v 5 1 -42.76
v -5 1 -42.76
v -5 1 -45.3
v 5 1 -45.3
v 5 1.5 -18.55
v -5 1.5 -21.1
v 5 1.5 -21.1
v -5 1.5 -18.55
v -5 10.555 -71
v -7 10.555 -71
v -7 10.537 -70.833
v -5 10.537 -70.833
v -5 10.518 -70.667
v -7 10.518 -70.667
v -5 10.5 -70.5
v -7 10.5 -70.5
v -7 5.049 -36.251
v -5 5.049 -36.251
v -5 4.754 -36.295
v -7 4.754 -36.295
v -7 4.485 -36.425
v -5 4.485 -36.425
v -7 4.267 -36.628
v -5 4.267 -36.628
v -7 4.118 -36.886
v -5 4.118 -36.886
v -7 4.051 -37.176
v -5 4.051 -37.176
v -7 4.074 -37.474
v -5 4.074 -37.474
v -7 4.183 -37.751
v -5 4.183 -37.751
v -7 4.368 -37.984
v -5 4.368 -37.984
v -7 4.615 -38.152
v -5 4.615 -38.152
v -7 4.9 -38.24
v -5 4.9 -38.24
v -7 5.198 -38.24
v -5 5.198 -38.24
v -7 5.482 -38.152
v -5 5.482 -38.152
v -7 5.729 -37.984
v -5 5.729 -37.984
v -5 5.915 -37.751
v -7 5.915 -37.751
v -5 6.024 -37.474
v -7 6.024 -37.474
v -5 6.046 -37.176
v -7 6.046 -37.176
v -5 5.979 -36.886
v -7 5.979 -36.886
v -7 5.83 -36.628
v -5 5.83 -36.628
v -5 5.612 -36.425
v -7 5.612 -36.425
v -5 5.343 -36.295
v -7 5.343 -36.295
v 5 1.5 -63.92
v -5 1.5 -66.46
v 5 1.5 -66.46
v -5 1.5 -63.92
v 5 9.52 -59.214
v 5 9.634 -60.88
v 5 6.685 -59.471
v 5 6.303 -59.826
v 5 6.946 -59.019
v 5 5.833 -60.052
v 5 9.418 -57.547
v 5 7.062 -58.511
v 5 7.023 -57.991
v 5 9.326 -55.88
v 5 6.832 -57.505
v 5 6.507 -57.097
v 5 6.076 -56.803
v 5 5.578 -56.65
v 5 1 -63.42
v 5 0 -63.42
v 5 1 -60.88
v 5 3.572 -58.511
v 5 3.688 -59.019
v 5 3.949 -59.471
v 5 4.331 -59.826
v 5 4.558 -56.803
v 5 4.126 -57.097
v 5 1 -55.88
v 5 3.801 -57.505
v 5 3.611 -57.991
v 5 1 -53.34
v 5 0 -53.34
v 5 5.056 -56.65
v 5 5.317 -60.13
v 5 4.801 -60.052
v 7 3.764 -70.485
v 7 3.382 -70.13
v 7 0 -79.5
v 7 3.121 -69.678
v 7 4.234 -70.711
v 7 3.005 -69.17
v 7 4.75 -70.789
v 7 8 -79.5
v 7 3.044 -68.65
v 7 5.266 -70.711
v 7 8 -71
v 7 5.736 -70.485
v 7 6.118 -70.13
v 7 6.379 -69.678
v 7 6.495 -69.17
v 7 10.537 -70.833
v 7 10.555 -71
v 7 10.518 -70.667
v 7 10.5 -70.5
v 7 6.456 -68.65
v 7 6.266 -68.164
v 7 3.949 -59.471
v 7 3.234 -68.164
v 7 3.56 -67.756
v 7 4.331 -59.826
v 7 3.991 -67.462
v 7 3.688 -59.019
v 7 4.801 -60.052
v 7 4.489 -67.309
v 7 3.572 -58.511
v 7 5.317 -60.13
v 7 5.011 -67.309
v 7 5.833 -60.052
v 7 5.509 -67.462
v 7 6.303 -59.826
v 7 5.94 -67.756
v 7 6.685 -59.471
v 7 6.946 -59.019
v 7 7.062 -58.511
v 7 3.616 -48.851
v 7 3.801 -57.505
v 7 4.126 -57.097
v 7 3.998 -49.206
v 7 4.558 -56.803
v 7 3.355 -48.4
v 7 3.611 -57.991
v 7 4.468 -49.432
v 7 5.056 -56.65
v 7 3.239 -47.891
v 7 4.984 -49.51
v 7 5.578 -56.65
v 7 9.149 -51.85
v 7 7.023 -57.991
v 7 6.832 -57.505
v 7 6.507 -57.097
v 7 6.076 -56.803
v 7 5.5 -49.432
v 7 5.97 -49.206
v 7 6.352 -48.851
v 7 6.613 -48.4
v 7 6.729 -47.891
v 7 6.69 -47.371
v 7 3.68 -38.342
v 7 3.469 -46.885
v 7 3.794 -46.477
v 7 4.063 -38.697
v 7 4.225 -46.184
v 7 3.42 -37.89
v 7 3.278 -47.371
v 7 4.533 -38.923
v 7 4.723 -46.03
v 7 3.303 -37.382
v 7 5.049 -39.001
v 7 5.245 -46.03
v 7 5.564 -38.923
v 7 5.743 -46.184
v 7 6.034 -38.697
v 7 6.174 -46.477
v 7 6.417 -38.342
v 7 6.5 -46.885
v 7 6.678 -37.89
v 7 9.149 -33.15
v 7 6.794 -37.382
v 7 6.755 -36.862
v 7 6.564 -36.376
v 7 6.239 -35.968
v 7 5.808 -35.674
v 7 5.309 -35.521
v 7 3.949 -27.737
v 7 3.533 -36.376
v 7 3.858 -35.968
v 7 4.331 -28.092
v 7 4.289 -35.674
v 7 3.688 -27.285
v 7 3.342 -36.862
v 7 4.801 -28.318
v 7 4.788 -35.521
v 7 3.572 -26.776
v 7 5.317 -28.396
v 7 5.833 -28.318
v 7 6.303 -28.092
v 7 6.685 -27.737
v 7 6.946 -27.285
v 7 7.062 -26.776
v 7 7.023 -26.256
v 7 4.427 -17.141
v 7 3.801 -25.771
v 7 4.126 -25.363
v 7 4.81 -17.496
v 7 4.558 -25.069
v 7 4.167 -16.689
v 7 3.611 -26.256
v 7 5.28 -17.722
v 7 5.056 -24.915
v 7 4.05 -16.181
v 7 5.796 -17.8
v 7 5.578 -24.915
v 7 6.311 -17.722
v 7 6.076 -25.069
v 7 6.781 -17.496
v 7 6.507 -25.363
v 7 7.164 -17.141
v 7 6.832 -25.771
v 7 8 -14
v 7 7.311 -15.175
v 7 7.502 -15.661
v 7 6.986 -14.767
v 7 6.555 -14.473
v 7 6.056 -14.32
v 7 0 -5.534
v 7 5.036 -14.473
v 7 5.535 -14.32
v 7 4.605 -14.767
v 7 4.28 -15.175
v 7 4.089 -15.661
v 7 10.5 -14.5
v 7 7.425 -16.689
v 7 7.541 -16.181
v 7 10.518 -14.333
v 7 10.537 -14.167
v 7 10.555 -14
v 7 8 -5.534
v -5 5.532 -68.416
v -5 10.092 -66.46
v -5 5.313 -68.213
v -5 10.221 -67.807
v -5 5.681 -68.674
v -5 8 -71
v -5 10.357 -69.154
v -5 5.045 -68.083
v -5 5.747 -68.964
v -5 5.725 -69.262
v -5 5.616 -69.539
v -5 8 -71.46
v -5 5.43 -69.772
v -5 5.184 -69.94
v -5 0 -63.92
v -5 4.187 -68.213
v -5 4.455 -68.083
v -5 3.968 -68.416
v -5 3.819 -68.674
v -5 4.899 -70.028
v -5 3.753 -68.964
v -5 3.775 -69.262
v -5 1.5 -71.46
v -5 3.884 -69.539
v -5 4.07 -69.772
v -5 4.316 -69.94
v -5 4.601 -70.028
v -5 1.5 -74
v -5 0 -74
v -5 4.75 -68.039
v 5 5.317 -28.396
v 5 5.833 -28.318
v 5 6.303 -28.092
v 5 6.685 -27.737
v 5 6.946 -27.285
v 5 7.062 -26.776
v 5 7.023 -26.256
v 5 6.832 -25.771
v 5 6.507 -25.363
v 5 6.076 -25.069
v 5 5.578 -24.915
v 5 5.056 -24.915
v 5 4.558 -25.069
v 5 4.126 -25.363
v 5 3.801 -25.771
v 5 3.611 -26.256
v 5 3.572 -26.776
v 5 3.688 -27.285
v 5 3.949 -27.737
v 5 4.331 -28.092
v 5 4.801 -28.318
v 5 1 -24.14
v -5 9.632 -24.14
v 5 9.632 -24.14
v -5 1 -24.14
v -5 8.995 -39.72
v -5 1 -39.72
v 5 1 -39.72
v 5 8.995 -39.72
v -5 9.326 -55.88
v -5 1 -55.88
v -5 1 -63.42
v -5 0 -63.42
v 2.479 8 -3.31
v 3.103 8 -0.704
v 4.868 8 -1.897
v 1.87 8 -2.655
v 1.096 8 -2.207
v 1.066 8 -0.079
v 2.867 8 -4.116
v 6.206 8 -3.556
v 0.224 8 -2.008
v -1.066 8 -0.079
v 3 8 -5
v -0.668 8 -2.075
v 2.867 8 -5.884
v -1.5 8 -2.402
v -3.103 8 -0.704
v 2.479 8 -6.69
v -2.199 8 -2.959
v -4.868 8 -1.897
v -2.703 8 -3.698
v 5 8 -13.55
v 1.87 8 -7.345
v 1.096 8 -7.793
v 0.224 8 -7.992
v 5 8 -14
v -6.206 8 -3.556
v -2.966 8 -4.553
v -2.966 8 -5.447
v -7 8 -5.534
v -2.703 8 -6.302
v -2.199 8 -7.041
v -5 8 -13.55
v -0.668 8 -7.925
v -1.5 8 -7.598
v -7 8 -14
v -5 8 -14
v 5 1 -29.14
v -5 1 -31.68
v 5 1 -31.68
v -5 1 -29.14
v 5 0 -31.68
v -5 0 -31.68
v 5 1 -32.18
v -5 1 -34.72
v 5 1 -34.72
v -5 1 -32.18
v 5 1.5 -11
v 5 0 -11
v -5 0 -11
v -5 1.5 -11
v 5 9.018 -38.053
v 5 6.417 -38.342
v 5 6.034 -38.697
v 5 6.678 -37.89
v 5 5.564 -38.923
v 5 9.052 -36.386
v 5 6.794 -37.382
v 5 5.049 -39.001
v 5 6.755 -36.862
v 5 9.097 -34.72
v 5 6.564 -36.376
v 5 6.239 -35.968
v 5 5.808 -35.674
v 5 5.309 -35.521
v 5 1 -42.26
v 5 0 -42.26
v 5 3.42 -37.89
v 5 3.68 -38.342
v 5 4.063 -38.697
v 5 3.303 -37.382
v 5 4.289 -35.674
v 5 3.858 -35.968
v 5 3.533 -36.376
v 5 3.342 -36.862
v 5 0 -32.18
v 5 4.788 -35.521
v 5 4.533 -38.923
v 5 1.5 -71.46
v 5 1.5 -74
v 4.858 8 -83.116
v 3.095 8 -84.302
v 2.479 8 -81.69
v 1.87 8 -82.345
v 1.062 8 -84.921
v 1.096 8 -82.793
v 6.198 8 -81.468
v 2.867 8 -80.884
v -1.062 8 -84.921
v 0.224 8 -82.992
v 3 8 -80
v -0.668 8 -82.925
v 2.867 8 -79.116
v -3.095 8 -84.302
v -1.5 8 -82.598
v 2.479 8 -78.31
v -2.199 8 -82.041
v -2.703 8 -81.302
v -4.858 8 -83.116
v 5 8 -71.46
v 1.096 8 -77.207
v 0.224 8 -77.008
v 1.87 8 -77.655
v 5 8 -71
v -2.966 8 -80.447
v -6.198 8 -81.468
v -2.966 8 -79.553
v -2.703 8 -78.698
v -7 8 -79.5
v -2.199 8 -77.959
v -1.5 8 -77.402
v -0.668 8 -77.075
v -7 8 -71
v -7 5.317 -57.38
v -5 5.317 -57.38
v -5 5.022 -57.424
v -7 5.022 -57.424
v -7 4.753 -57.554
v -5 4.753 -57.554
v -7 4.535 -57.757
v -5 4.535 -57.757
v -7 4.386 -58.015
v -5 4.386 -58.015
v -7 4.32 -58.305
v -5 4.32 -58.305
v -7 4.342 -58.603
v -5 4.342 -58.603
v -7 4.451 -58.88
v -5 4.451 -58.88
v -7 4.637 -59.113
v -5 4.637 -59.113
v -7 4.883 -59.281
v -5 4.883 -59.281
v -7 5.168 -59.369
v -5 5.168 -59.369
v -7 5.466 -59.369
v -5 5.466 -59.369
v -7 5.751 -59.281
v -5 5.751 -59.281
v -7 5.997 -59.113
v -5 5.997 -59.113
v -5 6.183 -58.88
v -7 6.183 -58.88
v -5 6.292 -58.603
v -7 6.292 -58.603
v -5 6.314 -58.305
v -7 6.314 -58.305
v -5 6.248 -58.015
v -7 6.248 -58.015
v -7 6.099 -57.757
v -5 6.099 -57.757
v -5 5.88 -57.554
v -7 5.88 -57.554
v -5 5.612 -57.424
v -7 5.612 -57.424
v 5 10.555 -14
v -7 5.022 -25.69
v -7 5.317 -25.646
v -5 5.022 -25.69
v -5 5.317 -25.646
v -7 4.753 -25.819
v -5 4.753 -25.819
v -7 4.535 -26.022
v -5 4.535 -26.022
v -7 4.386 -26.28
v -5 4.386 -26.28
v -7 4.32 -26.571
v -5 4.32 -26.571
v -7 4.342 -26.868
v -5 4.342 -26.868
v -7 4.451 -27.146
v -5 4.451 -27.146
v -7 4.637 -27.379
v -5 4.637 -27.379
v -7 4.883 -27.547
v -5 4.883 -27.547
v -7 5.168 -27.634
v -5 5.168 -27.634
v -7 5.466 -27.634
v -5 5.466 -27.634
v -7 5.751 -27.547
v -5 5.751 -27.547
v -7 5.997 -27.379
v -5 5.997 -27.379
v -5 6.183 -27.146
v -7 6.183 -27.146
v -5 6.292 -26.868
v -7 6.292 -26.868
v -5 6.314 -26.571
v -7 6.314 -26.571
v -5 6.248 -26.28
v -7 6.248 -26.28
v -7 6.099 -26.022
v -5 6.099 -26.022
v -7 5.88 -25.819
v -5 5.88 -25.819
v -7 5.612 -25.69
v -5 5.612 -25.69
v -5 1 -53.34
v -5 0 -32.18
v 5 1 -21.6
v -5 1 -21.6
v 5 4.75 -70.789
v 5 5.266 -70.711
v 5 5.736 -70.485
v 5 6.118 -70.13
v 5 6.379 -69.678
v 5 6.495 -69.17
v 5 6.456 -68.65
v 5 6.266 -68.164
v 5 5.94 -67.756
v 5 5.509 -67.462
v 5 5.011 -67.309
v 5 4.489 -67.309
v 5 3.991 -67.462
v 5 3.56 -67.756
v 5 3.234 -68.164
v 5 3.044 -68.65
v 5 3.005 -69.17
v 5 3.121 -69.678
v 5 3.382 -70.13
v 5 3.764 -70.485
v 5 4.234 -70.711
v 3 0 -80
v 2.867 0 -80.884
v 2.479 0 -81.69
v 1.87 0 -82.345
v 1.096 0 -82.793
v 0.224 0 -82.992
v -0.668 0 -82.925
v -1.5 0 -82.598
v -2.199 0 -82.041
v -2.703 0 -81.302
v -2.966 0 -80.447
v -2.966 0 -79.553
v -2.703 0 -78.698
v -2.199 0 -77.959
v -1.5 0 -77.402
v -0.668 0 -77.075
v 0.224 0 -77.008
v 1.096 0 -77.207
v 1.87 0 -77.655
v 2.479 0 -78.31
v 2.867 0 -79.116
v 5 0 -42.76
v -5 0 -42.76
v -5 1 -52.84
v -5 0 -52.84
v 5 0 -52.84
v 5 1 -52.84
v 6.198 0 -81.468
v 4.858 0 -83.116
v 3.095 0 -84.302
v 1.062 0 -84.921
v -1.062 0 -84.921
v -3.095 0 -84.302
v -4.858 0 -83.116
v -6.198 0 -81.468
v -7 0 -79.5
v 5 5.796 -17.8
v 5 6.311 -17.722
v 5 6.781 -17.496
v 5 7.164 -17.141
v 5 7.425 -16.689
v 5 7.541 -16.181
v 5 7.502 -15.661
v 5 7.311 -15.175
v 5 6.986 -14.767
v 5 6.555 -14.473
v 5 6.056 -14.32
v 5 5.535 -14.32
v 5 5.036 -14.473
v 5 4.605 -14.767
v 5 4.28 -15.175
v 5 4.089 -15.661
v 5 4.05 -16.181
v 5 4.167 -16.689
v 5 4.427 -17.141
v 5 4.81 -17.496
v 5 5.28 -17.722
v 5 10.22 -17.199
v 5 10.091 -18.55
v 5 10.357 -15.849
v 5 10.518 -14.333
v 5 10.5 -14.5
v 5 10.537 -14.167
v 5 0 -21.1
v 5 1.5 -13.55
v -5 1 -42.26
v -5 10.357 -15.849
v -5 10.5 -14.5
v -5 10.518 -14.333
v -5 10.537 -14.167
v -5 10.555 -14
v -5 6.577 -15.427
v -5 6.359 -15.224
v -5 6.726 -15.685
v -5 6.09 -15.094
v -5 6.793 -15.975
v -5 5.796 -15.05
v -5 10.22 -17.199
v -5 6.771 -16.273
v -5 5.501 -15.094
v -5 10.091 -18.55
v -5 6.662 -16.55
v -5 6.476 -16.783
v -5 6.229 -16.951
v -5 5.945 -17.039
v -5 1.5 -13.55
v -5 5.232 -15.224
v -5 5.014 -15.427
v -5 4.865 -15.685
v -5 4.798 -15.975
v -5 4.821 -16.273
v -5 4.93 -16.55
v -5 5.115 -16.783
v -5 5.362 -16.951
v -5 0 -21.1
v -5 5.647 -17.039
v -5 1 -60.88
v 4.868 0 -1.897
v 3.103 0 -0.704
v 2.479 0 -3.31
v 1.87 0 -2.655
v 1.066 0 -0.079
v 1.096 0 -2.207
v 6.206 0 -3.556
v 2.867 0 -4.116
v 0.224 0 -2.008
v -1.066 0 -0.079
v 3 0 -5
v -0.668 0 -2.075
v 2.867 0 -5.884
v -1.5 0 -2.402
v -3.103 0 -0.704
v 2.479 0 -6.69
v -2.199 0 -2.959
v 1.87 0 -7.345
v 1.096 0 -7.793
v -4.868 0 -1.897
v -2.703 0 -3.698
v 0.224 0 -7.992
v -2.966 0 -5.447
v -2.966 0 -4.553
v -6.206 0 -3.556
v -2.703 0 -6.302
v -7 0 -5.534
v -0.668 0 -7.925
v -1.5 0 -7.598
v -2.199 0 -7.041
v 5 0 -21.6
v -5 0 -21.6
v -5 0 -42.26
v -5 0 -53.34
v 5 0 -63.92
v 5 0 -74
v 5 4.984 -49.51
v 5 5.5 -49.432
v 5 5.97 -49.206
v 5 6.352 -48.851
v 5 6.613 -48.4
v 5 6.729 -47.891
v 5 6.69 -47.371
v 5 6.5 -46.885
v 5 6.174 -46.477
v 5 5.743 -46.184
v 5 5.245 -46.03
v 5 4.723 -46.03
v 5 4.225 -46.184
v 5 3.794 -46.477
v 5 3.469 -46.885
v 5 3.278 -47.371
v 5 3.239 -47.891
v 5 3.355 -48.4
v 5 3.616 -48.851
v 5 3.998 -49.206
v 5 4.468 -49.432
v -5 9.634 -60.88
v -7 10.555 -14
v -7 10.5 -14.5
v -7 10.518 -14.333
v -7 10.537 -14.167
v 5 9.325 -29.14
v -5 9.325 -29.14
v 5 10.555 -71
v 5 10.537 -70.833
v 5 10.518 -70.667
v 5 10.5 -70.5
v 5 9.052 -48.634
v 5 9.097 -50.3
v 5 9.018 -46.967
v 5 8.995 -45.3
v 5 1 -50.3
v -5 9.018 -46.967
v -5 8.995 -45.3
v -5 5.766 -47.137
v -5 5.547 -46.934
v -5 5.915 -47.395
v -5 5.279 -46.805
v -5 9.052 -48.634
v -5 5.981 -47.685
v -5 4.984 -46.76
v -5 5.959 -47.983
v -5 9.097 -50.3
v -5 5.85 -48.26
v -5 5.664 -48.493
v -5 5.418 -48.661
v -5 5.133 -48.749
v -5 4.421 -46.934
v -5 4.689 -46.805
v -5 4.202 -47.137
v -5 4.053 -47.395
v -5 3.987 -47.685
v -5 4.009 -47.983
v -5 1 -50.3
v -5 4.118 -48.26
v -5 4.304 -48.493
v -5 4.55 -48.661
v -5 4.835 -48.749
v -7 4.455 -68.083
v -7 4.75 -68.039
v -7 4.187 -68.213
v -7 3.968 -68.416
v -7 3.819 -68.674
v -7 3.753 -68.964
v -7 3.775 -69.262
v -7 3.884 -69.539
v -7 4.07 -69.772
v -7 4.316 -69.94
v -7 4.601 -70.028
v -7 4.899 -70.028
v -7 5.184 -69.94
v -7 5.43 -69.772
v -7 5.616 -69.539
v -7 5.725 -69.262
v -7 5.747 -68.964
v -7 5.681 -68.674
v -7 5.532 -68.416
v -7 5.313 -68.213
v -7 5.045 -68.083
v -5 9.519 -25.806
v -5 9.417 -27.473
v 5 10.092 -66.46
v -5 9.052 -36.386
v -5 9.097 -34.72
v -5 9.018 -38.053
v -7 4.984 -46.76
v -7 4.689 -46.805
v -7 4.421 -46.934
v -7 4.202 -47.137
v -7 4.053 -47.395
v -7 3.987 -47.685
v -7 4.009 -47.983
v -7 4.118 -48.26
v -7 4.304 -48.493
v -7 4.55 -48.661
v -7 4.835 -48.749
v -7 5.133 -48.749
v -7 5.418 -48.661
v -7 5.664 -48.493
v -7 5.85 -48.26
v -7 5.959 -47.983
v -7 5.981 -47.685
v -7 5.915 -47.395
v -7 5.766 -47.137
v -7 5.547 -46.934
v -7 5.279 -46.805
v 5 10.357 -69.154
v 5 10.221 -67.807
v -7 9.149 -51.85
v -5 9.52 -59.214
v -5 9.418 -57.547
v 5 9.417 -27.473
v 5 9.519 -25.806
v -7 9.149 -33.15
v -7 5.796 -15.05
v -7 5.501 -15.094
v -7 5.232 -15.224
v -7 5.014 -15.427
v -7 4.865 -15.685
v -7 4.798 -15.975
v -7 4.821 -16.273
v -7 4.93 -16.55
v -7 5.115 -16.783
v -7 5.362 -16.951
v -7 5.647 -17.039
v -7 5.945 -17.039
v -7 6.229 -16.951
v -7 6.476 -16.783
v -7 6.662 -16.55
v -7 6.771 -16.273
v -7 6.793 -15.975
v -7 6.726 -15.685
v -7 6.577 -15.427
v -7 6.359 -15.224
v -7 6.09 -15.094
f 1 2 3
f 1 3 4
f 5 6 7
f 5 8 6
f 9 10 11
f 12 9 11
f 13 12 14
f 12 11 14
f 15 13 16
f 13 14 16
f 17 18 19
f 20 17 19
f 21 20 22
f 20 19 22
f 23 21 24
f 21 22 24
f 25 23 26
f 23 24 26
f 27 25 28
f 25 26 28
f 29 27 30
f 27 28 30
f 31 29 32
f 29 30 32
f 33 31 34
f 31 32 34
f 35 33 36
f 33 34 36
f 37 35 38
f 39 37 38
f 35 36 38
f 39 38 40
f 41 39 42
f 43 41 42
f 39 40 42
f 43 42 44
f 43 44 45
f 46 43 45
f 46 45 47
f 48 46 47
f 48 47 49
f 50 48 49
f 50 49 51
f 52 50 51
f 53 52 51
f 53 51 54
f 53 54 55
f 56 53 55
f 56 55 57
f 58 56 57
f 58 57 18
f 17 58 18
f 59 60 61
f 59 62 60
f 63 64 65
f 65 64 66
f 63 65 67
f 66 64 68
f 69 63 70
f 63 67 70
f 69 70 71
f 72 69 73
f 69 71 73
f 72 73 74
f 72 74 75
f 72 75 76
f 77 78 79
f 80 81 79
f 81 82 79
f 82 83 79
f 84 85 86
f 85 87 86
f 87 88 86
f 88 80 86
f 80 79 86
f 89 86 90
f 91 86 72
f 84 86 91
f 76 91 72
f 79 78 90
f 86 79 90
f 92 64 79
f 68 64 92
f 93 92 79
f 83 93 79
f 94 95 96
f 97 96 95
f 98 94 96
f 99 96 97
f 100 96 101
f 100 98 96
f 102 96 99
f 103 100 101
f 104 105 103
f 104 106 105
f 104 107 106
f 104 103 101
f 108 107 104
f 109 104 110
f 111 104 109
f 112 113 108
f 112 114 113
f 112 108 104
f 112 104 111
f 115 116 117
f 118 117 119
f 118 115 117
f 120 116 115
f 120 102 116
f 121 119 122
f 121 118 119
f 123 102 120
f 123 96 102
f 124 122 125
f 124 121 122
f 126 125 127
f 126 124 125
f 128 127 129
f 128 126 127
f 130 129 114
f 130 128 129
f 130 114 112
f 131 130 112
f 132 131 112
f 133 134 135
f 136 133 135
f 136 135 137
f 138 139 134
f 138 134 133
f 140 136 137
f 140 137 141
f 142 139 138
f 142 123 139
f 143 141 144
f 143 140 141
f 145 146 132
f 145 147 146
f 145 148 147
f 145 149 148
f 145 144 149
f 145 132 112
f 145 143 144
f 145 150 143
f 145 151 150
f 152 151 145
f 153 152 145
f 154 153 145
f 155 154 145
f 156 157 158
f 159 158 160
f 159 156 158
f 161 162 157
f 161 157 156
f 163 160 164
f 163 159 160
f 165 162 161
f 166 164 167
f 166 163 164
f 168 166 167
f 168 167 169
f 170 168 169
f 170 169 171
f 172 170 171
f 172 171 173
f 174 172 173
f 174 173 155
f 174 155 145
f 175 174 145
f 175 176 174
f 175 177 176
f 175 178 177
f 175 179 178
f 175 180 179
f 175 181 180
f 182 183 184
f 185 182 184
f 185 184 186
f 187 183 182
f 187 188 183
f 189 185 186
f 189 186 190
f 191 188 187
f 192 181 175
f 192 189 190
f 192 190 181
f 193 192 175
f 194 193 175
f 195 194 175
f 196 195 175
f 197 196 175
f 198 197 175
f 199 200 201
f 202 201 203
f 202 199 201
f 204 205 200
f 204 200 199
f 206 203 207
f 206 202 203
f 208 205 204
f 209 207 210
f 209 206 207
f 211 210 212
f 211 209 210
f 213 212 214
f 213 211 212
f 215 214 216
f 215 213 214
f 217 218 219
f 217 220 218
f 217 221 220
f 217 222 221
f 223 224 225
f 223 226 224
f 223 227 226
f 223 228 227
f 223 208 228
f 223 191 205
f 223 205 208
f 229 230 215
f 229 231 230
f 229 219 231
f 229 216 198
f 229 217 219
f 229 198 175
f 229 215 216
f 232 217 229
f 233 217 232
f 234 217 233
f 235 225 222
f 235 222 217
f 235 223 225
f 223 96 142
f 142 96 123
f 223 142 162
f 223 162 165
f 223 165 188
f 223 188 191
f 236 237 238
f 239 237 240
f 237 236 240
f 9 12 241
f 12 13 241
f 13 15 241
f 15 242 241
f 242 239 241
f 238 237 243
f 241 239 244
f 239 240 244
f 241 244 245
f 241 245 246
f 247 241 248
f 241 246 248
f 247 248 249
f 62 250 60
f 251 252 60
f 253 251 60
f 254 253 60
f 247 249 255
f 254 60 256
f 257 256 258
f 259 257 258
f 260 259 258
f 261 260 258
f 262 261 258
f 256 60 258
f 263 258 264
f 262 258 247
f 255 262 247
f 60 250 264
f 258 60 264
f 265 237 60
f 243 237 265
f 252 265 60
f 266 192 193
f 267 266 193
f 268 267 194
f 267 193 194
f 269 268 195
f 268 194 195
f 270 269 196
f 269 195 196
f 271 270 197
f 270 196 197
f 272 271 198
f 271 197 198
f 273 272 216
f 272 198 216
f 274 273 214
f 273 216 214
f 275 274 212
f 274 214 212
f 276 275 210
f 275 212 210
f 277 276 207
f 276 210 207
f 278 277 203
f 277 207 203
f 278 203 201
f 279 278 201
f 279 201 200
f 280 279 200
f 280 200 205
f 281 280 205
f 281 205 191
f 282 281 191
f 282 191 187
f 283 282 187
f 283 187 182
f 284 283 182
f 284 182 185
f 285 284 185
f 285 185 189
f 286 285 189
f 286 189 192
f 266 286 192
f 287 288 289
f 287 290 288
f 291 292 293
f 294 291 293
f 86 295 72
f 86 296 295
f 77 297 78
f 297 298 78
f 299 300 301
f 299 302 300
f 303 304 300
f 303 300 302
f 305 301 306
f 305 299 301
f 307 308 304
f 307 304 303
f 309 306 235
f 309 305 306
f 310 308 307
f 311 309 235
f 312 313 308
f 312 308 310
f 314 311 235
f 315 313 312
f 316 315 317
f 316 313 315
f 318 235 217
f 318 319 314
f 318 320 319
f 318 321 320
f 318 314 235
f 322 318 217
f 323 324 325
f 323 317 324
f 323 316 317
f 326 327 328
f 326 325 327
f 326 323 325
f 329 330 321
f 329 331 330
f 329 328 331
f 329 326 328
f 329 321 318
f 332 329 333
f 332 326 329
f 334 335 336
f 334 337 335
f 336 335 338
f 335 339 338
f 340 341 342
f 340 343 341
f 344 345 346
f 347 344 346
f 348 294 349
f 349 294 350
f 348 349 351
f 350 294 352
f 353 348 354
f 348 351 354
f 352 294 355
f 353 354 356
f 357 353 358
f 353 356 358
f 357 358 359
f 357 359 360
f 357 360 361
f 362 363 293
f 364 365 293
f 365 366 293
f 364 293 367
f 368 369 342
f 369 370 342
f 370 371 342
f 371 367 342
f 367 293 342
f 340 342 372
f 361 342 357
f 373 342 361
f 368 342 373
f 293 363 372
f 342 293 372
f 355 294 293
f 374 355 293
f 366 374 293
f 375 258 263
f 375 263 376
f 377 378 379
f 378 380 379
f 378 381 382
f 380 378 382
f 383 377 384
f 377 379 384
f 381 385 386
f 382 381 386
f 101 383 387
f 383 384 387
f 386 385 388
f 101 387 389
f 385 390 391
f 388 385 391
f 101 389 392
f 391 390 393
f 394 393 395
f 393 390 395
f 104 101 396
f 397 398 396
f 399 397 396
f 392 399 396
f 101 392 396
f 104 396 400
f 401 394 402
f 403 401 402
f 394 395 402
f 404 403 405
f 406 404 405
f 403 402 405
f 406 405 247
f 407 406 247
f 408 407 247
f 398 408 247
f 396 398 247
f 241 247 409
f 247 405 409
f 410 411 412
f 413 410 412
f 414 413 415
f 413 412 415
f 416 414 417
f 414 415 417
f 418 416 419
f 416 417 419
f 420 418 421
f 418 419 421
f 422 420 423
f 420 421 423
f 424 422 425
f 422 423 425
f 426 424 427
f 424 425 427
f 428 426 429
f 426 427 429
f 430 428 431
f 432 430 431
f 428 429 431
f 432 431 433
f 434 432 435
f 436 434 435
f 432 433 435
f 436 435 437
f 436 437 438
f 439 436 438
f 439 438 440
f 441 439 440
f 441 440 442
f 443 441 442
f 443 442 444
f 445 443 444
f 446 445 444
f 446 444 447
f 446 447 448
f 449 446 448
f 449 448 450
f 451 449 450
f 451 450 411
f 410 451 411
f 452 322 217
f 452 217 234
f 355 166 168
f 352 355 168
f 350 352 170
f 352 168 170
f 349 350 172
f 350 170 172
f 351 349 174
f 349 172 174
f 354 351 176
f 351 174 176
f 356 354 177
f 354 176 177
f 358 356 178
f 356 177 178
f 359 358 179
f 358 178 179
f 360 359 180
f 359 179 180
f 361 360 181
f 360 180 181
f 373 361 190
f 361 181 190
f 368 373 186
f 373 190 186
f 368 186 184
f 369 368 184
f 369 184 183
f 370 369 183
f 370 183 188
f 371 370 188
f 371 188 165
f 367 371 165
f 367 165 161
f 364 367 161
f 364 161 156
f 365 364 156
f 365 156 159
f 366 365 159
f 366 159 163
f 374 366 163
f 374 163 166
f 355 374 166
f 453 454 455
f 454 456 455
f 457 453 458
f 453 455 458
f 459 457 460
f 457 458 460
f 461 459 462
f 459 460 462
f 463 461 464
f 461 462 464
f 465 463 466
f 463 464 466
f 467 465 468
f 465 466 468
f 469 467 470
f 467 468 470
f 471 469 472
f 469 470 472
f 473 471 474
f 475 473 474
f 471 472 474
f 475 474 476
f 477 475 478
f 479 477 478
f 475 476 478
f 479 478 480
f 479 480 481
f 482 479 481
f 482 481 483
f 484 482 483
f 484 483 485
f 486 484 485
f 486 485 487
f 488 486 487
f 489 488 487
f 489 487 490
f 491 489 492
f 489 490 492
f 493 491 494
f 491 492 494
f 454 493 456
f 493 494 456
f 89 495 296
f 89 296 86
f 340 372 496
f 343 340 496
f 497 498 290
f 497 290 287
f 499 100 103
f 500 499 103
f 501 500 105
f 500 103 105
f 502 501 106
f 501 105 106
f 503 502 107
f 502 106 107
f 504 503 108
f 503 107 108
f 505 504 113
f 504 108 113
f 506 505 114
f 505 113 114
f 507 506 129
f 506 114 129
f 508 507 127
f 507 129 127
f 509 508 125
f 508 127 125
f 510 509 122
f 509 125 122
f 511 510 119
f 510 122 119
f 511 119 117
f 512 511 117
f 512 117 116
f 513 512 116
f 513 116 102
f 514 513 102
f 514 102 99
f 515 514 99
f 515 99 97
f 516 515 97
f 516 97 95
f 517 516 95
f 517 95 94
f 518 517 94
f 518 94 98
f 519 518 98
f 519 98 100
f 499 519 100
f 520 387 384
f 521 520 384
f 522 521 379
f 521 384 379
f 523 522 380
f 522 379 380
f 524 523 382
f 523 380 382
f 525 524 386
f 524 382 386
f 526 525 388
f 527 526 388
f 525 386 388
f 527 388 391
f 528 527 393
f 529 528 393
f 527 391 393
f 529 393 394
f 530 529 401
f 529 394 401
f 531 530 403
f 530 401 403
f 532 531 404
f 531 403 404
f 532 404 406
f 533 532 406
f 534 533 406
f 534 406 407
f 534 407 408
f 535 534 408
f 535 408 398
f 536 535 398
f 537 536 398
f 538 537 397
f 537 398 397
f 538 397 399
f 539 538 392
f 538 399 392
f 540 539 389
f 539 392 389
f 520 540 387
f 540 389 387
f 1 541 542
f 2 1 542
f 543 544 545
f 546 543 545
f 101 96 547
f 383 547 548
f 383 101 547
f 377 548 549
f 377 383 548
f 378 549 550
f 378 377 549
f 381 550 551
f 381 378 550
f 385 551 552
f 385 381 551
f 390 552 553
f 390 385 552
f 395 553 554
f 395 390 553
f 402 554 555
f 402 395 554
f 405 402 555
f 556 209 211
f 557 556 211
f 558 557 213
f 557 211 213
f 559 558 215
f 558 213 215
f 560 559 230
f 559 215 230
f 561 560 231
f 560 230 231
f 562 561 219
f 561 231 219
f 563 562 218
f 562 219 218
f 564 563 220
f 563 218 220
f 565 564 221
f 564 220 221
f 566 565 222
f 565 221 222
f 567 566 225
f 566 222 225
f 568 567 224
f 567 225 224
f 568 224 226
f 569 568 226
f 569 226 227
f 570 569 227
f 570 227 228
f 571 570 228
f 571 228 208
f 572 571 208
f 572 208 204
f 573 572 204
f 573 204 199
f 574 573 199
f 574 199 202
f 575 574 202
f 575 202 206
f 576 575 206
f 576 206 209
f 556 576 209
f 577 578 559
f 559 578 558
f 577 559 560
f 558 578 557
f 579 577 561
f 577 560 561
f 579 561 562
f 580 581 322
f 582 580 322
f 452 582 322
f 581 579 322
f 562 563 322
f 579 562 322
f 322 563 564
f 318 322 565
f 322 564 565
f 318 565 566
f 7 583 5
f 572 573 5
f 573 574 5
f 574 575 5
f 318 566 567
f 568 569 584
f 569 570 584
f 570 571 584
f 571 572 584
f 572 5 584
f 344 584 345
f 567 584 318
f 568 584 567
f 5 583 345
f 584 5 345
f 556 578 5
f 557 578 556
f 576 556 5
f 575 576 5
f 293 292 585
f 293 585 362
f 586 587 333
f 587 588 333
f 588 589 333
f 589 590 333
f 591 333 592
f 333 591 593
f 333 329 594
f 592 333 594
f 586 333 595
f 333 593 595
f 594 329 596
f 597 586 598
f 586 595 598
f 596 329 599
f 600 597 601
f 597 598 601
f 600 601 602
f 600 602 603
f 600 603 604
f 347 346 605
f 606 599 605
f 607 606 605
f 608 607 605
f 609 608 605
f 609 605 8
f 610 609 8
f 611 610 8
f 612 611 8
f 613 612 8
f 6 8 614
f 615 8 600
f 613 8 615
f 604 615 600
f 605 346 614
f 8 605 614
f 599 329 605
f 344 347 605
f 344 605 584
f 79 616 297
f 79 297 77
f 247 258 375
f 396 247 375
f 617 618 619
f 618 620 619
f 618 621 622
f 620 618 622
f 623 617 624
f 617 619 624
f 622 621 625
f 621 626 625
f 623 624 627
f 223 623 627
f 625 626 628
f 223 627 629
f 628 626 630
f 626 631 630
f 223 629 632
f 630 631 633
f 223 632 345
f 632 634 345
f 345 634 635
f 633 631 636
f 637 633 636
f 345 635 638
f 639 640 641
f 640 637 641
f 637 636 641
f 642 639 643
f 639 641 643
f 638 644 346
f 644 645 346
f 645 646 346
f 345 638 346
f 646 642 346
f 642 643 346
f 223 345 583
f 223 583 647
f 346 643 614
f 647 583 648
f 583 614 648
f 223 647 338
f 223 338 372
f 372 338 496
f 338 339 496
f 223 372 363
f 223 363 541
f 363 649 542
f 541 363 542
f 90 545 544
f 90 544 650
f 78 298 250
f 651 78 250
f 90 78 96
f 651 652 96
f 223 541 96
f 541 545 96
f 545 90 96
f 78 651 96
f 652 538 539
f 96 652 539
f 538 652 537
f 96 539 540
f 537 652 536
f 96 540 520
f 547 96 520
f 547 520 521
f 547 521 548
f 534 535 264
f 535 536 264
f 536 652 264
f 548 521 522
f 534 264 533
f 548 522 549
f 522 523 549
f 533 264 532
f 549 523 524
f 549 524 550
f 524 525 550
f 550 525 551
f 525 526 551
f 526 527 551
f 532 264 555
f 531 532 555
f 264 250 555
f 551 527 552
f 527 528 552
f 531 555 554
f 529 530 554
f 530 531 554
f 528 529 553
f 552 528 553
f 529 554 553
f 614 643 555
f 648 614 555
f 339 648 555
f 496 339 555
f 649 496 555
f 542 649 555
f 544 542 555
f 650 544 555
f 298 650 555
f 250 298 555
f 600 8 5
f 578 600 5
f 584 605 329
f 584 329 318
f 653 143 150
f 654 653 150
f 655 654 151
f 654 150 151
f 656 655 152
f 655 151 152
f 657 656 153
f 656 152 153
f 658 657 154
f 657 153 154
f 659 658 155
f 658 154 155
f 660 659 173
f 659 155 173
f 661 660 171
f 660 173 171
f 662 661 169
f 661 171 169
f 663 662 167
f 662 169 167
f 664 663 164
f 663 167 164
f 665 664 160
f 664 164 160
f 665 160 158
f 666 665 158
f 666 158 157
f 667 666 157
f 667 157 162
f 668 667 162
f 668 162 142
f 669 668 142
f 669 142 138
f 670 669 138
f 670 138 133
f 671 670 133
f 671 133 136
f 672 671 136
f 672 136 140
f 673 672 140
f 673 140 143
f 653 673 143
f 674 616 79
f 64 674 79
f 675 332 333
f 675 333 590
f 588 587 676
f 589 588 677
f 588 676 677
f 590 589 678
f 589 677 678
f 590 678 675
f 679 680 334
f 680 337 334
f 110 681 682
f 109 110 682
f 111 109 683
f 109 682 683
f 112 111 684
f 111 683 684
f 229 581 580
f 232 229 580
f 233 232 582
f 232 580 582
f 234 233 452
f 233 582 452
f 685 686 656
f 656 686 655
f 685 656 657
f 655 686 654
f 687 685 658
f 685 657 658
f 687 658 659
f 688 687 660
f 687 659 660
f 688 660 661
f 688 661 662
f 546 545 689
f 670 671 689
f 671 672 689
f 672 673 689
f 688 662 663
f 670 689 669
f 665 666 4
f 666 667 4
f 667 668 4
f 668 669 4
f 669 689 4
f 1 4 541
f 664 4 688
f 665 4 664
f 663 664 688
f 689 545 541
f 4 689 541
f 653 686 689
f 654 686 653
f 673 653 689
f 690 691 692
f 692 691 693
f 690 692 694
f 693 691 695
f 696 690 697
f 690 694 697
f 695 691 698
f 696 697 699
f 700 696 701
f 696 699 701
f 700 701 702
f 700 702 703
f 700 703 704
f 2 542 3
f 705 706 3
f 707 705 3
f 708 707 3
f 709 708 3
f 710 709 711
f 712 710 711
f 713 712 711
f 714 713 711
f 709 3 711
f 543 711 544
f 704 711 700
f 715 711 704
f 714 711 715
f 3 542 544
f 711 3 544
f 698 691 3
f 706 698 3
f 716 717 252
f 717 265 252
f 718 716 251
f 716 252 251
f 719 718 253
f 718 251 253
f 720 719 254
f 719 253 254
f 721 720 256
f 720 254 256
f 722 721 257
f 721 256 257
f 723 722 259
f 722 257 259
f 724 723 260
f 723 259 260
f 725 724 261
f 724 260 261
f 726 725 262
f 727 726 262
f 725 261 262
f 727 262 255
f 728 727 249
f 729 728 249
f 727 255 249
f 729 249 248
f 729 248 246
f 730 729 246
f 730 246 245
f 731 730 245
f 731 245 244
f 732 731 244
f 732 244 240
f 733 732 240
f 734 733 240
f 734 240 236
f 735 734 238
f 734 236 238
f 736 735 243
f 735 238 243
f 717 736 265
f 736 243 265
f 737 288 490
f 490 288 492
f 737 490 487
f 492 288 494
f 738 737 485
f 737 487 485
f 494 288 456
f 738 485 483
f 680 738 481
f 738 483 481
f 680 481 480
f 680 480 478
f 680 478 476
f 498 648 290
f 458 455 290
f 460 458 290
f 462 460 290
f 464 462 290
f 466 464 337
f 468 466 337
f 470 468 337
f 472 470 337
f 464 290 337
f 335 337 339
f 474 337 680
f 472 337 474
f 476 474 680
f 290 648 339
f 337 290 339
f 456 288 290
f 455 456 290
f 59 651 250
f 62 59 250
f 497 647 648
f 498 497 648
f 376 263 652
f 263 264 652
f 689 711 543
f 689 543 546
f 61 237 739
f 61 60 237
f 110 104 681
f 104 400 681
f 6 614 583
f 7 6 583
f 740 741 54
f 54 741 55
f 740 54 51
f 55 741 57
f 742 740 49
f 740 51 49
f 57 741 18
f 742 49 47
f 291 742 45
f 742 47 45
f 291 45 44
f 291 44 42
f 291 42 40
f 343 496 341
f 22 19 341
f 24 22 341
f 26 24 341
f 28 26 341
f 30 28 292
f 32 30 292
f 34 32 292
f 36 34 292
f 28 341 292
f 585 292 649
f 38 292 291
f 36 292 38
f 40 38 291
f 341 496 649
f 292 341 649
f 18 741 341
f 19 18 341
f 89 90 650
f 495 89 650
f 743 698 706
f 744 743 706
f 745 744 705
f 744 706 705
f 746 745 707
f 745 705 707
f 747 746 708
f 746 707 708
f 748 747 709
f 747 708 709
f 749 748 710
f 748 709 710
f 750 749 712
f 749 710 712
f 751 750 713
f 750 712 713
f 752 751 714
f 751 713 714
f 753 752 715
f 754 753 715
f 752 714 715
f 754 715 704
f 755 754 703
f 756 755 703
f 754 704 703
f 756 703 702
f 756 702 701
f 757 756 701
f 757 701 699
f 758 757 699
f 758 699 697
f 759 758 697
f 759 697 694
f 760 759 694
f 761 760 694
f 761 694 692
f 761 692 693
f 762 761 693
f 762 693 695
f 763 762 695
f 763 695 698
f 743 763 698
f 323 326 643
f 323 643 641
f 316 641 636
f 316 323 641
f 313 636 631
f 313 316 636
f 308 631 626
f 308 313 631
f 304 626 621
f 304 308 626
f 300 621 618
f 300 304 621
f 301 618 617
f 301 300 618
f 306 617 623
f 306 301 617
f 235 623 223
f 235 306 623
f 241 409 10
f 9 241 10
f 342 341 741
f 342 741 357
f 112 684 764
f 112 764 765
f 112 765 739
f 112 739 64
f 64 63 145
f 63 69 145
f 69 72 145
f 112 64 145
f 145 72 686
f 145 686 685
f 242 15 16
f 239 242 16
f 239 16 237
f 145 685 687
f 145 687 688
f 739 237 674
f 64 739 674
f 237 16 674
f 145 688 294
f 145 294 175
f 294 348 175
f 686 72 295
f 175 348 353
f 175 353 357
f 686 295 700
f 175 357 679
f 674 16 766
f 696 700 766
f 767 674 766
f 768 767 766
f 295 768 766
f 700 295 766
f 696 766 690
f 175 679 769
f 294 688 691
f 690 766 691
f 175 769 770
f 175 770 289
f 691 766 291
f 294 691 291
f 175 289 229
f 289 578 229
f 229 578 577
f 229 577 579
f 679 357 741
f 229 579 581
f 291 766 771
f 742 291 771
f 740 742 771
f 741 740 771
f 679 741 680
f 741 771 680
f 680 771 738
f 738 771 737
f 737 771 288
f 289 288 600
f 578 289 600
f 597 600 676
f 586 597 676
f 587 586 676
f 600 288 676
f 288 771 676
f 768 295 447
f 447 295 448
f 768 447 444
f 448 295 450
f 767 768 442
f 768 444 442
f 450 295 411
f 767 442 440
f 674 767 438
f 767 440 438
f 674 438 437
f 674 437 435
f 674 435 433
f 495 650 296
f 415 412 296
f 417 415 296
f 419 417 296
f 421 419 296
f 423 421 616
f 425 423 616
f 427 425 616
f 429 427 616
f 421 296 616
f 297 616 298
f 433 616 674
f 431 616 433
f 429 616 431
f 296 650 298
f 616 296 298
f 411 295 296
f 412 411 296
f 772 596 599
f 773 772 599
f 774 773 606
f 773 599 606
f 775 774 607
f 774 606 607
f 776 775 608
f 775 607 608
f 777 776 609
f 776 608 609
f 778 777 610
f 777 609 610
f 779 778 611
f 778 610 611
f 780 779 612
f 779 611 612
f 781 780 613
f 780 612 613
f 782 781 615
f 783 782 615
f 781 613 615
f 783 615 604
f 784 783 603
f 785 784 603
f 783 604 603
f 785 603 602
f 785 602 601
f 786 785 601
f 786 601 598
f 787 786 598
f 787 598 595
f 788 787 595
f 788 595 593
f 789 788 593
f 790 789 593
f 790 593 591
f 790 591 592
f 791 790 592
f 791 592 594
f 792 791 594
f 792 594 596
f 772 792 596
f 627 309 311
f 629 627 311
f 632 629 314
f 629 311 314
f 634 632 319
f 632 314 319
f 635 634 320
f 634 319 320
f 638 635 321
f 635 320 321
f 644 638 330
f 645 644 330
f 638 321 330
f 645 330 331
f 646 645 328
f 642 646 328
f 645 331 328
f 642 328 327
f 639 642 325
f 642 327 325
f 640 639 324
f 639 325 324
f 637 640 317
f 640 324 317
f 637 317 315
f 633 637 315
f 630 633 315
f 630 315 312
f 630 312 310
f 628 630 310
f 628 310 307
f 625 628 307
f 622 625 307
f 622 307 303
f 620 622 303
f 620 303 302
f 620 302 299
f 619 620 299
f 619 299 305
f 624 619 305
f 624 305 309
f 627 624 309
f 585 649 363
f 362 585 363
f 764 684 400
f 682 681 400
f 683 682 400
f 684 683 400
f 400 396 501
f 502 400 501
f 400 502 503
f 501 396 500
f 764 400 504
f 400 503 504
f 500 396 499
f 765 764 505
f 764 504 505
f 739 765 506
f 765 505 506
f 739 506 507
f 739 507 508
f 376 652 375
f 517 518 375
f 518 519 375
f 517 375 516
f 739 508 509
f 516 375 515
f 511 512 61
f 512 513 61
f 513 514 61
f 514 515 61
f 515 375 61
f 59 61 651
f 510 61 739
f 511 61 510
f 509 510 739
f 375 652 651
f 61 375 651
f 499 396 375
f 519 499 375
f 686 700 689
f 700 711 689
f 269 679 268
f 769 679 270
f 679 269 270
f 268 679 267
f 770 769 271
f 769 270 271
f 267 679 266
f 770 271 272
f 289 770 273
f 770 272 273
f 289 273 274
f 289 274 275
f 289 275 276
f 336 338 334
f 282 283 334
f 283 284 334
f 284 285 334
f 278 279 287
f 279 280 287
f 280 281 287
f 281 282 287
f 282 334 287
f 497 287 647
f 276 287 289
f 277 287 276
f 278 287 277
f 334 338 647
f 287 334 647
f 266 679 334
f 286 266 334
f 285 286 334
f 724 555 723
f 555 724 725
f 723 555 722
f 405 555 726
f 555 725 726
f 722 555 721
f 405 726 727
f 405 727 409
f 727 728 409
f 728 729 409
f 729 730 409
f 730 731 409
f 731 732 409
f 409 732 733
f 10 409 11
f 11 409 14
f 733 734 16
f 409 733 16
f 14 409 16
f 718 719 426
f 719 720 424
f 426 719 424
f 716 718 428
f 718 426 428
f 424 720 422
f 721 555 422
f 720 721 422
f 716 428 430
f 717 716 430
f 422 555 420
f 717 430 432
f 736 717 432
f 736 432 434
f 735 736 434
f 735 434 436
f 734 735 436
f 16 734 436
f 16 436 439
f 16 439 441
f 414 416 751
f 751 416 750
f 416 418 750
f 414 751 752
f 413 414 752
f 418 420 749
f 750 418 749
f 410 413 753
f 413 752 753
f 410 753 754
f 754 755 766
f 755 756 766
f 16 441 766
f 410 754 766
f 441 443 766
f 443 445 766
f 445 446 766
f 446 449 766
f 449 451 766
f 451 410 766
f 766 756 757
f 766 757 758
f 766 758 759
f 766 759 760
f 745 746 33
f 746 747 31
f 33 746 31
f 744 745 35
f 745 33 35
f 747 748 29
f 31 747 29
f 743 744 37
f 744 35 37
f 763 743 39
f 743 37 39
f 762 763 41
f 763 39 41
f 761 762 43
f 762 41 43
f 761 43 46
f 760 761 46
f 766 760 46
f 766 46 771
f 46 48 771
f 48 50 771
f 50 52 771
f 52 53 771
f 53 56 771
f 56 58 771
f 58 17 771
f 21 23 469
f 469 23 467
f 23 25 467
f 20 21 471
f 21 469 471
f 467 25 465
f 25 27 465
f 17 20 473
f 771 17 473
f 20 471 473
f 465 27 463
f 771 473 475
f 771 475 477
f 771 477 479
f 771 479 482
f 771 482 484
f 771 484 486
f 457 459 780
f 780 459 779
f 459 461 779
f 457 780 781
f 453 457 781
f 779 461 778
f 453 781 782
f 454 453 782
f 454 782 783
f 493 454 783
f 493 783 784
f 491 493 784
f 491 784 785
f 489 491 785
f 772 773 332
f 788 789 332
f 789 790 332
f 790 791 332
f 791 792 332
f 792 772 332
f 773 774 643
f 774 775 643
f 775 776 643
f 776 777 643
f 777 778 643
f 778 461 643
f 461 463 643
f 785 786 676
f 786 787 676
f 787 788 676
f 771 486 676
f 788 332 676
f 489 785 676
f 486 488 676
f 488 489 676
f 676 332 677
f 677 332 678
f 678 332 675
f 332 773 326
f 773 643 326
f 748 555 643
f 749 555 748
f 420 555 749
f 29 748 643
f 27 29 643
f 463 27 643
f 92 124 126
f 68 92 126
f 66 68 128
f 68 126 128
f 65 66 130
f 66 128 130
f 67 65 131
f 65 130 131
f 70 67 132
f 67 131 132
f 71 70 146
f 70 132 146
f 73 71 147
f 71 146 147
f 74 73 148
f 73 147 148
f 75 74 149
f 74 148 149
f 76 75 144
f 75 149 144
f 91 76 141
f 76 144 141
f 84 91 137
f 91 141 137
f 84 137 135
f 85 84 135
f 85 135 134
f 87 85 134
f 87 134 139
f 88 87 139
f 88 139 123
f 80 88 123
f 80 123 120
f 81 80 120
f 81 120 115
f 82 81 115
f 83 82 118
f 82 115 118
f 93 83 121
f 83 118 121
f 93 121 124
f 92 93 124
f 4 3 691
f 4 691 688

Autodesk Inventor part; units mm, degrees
ref_plane "YZ Plane" through (0, 0, 0) normal (1, 0, 0) x (0, 1, 0)
ref_plane "XY Plane" through (0, 0, 0) normal (0, 0, 1) x (1, 0, 0)
sketch "Sketch1" plane through (0, 0, 0) normal (1, 0, 0) x (0, 1, 0)
  line L0 (0, 0) -> (0, -85)
  line L1 (0, -85) -> (8, -85)
  line L2 (0, 0) -> (8, 0)
  line L3 (8, 0) -> (8, -14)
  line L4 (8, -85) -> (8, -71)
  line L5 (8, -14) -> (9, -14)
  line L6 (8, -71) -> (9, -71)
  arc A0 (10.5, -14.5) -> (10.5, -70.5) centre (267.5593, -42.5) ccw
  line L7 (8, -71) -> (10.555, -71)
  line L8 (8, -14) -> (10.555, -14)
  arc A1 (10.555, -14) -> (10.555, -71) centre (267.5473, -42.5) ccw
extrude "Extrusion1" add sketch "Sketch1" along normal mid plane 14
sketch "Sketch2" plane through (-7, 8, 0) normal (0, 1, 0) x (1, 0, 0)
  line L0 (0, 85) -> (0, 0) projected
  line L1 (0, 14.0338) -> (0, 5.5338)
  line L2 (14, 0) -> (14, 85) projected
  line L3 (14, 14.0338) -> (14, 5.5338)
  arc A0 (0, 5.5338) -> (14, 5.5338) centre (7, 7.1942) ccw
  line L4 (0, 5.5338) -> (0, 0)
  line L5 (0, 0) -> (14, 0) projected
  line L6 (14, 0) -> (14, 5.5338)
  point P0 (7, 0)
  dimension "d13" = 8.5
extrude "Extrusion2" cut sketch "Sketch2" against normal blind 14
sketch "Sketch3" plane through (-7, 8, -71) normal (0, 1, 0) x (1, 0, 0)
  line L0 (0, 0) -> (14, 0) projected
  line L1 (0, 0) -> (0, 14) projected
  arc A0 (14, 8.5) -> (0, 8.5) centre (7, 6.7955) ccw
  line L2 (0, 8.5) -> (0, 14)
  line L3 (0, 14) -> (14, 14) projected
  line L4 (14, 14) -> (14, 8.5)
  line L5 (14, -65.4662) -> (14, 14) projected
  line L6 (0, 14) -> (0, 8.5)
  line L7 (14, 8.5) -> (14, 14)
  line L8 (14, 14) -> (0, 14)
  line L9 (0, 8.5) -> (0, 14)
  line L10 (0, 14) -> (14, 14) projected
  line L11 (14, 14) -> (14, 8.5)
  line L12 (14, 14) -> (14, 0) projected
  arc A1 (14, 8.5) -> (0, 8.5) centre (7, 6.7955) ccw
  point P0 (7, -71)
extrude "Extrusion3" cut sketch "Sketch3" against normal blind 14 contours L1 L3 A0 | A0 L3 L4
sketch "Sketch4" plane through (-7, 8, -71) normal (0, 1, 0) x (1, 0, 0)
  arc A0 (14, 8.5) -> (0, 8.5) centre (7, 6.7955) ccw projected
  line L0 (7, 0.0396) -> (7, 3.0396)
  circle A1 centre (7, 9) radius 3
  point P0 (7, -71)
extrude "Extrusion4" cut sketch "Sketch4" against normal blind 14
sketch "Sketch5" plane through (-7, 8, -14) normal (0, 1, 0) x (1, 0, 0)
  circle A0 centre (7, -9) radius 3
  point P0 (7, -14)
extrude "Extrusion5" cut sketch "Sketch5" against normal blind 14
sketch "Sketch7" plane through (0, 0, -7.1942) normal (0, -1, 0) x (1, 0, 0)
  circle A0 centre (0, 2.1942) radius 3 projected
  line L0 (0, -0.8058) -> (0, -3.8058)
  circle A1 centre (0, -72.8058) radius 3 projected
  line L1 (0, -69.8058) -> (0, -66.8058)
  line L2 (0, -66.8058) -> (-5, -66.8058)
  line L3 (-5, -66.8058) -> (5, -66.8058)
  line L4 (-5, -66.8058) -> (5, -66.8058)
  line L5 (5, -66.8058) -> (5, -56.7258)
  line L6 (5, -56.7258) -> (-5, -56.7258)
  line L7 (-5, -56.7258) -> (-5, -66.8058)
  line L8 (0, -56.7258) -> (0, -56.2258)
  line L9 (-5, -56.2258) -> (5, -56.2258)
  line L10 (5, -56.2258) -> (5, -46.1458)
  line L11 (5, -46.1458) -> (-5, -46.1458)
  line L12 (-5, -46.1458) -> (-5, -56.2258)
  line L13 (0, -46.1458) -> (0, -45.6458)
  line L14 (-5, -45.6458) -> (5, -45.6458)
  line L15 (5, -45.6458) -> (5, -35.5658)
  line L16 (5, -35.5658) -> (-5, -35.5658)
  line L17 (-5, -35.5658) -> (-5, -45.6458)
  line L18 (0, -35.5658) -> (0, -35.0658)
  line L19 (-5, -35.0658) -> (5, -35.0658)
  line L20 (5, -35.0658) -> (5, -24.9858)
  line L21 (5, -24.9858) -> (-5, -24.9858)
  line L22 (-5, -24.9858) -> (-5, -35.0658)
  line L23 (0, -24.9858) -> (0, -24.4858)
  line L24 (-5, -24.4858) -> (5, -24.4858)
  line L25 (5, -24.4858) -> (5, -14.4058)
  line L26 (5, -14.4058) -> (-5, -14.4058)
  line L27 (-5, -14.4058) -> (-5, -24.4858)
  line L28 (0, -14.4058) -> (0, -13.9058)
  line L29 (-5, -13.9058) -> (5, -13.9058)
  line L30 (5, -13.9058) -> (5, -3.8058)
  line L31 (5, -3.8058) -> (-5, -3.8058)
  line L32 (-5, -3.8058) -> (-5, -13.9058)
  point P0 (0, 7.1942)
extrude "Extrusion6" cut sketch "Sketch7" against normal blind 1.5 contours L6 L5 L3 L2 L7 | L31 L30 L29 L32
sketch "Sketch8" plane through (0, 0, -7.1942) normal (0, -1, 0) x (1, 0, 0)
  line L0 (-5, -56.7258) -> (5, -56.7258) projected
  line L1 (0, -56.7258) -> (0, -56.2258)
  line L2 (-5, -56.2258) -> (5, -56.2258)
  line L3 (5, -56.2258) -> (5, -46.1458)
  line L4 (5, -46.1458) -> (-5, -46.1458)
  line L5 (-5, -46.1458) -> (-5, -56.2258)
  line L6 (0, -46.1458) -> (0, -45.6458)
  line L7 (-5, -45.6458) -> (5, -45.6458)
  line L8 (5, -45.6458) -> (5, -35.5658)
  line L9 (5, -35.5658) -> (-5, -35.5658)
  line L10 (-5, -35.5658) -> (-5, -45.6458)
  line L11 (0, -35.5658) -> (0, -35.0658)
  line L12 (-5, -35.0658) -> (5, -35.0658)
  line L13 (5, -35.0658) -> (5, -24.9858)
  line L14 (5, -24.9858) -> (-5, -24.9858)
  line L15 (-5, -24.9858) -> (-5, -35.0658)
  line L16 (0, -24.9858) -> (0, -24.4858)
  line L17 (-5, -24.4858) -> (5, -24.4858)
  line L18 (5, -24.4858) -> (5, -14.4058)
  line L19 (5, -14.4058) -> (-5, -14.4058)
  line L20 (-5, -14.4058) -> (-5, -24.4858)
  point P0 (0, 7.1942)
  dimension "d75" = 0.5
  dimension "d76" = 10.08
  dimension "d77" = 0.5
  dimension "d78" = 10.08
  dimension "d79" = 0.5
  dimension "d80" = 10.08
  dimension "d81" = 0.5
  dimension "d82" = 10.08
extrude "Extrusion7" cut sketch "Sketch8" against normal blind 1
sketch "Sketch9" plane through (0, 1.5, -7.1942) normal (0, -1, 0) x (1, 0, 0)
  line L0 (-5, -66.8058) -> (-5, -56.7258) projected
  line L1 (5, -56.7258) -> (5, -66.8058) projected
  line L2 (-5, -59.2658) -> (5, -59.2658)
  line L3 (-5, -64.2658) -> (5, -64.2658)
  line L4 (-5, -64.2658) -> (-5, -59.2658)
  line L5 (5, -64.2658) -> (5, -59.2658)
  line L6 (5, -64.2658) -> (5, -59.2658)
  point P0 (0, 7.1942)
extrude "Extrusion8" cut sketch "Sketch9" against normal blind 20
sketch "Sketch10" plane through (0, 1, -7.1942) normal (0, -1, 0) x (1, 0, 0)
  line L0 (-5, -56.2258) -> (-5, -46.1458) projected
  line L1 (5, -46.1458) -> (5, -56.2258) projected
  line L2 (-5, -53.6858) -> (5, -53.6858)
  line L3 (-5, -48.6858) -> (5, -48.6858)
  line L4 (5, -48.6858) -> (5, -53.6858)
  line L5 (-5, -48.6858) -> (-5, -53.6858)
  point P0 (0, 7.1942)
  dimension "d109" = 5
extrude "Extrusion9" cut sketch "Sketch10" against normal blind 20
sketch "Sketch11" plane through (0, 1, -7.1942) normal (0, -1, 0) x (1, 0, 0)
  line L0 (-5, -45.6458) -> (-5, -35.5658) projected
  line L1 (5, -35.5658) -> (5, -45.6458) projected
  line L2 (-5, -43.1058) -> (5, -43.1058)
  line L3 (-5, -38.1058) -> (5, -38.1058)
  line L4 (5, -38.1058) -> (5, -43.1058)
  line L5 (-5, -38.1058) -> (-5, -43.1058)
  point P0 (0, 7.1942)
extrude "Extrusion10" cut sketch "Sketch11" against normal blind 20
sketch "Sketch12" plane through (0, 1, -7.1942) normal (0, -1, 0) x (1, 0, 0)
  line L0 (-5, -35.0658) -> (-5, -24.9858) projected
  line L1 (5, -24.9858) -> (5, -35.0658) projected
  line L2 (-5, -32.5258) -> (5, -32.5258)
  line L3 (-5, -27.5258) -> (5, -27.5258)
  line L4 (5, -27.5258) -> (5, -32.5258)
  line L5 (-5, -27.5258) -> (-5, -32.5258)
  point P0 (0, 7.1942)
extrude "Extrusion11" cut sketch "Sketch12" against normal blind 20
sketch "Sketch13" plane through (0, 1, -7.1942) normal (0, -1, 0) x (1, 0, 0)
  line L0 (-5, -24.4858) -> (-5, -14.4058) projected
  line L1 (-5, -21.9458) -> (5, -21.9458)
  line L2 (-5, -16.9458) -> (5, -16.9458)
  line L3 (5, -16.9458) -> (5, -21.9458)
  line L4 (5, -14.4058) -> (5, -24.4858) projected
  line L5 (-5, -16.9458) -> (-5, -21.9458)
  point P0 (0, 7.1942)
extrude "Extrusion12" cut sketch "Sketch13" against normal blind 20
sketch "Sketch14" plane through (0, 1.5, -7.1942) normal (0, -1, 0) x (1, 0, 0)
  line L0 (-5, -13.9058) -> (-5, -3.8058) projected
  line L1 (5, -3.8058) -> (5, -13.9058) projected
  line L2 (-5, -11.3558) -> (5, -11.3558)
  line L3 (-5, -6.3558) -> (5, -6.3558)
  line L4 (5, -6.3558) -> (5, -11.3558)
  line L5 (-5, -6.772) -> (-5, -11.3558)
  line L6 (-5, -6.3558) -> (-5, -11.3558)
  point P0 (0, 7.1942)
extrude "Extrusion13" cut sketch "Sketch14" against normal blind 20
ref_plane "Work Plane1" through (0, 8.9795, -42.5) normal (0, 1, 0) x (-1, 0, 0)
sketch "Sketch24" plane through (5, 0, -74) normal (-1, 0, 0) x (0, 0, 1)
  line L0 (7.54, 1.5) -> (7.54, 10.0921) projected
  line L1 (2.54, 8) -> (3, 8) projected
  circle A0 centre (4.961, 4.75) radius 1
  line L2 (13.12, 1) -> (13.12, 9.6336) projected
  line L3 (18.12, 1) -> (18.12, 9.326) projected
  circle A1 centre (15.62, 5.3168) radius 1
  line L4 (23.7, 1) -> (23.7, 9.0972) projected
  line L5 (28.7, 1) -> (28.7, 8.9947) projected
  circle A2 centre (26.2398, 4.9841) radius 1
  line L6 (34.28, 1) -> (31.74, 1) projected
  circle A3 centre (36.749, 5.0486) radius 1
  line L7 (44.86, 1) -> (42.32, 1) projected
  circle A4 centre (47.3544, 5.3168) radius 1
  line L8 (60.45, 1.5) -> (60.45, 8) projected
  line L9 (55.45, 1.5) -> (55.45, 10.0911) projected
  circle A5 centre (57.95, 5.7956) radius 1
  point P0 (74, 0)
  point P1 (2.54, 1.5)
extrude "Extrusion14" cut sketch "Sketch24" along normal mid plane 52
sketch "Sketch25" plane through (7, 0, 0) normal (1, 0, 0) x (0, 0, -1)
  circle A0 centre (69.039, 4.75) radius 1 projected
  circle A1 centre (58.38, 5.3168) radius 1 projected
  circle A2 centre (47.7602, 4.9841) radius 1 projected
  circle A3 centre (37.251, 5.0486) radius 1 projected
  circle A4 centre (26.6456, 5.3168) radius 1 projected
  circle A5 centre (16.05, 5.7956) radius 1 projected
  circle A6 centre (16.05, 5.7956) radius 1.75
  circle A7 centre (26.6456, 5.3168) radius 1.75
  circle A8 centre (37.251, 5.0486) radius 1.75
  circle A9 centre (47.7602, 4.9841) radius 1.75
  circle A10 centre (58.38, 5.3168) radius 1.75
  circle A11 centre (69.039, 4.75) radius 1 projected
  circle A12 centre (69.039, 4.75) radius 1.75
  point P0 (0, 0)
  dimension "d129" = 3.5
  dimension "d130" = 3.5
  dimension "d131" = 3.5
  dimension "d132" = 3.5
  dimension "d133" = 3.5
  dimension "d134" = 3.5
extrude "Extrusion15" cut sketch "Sketch25" against normal blind 5
properties part number "segurador das cordas" material "Steel"
